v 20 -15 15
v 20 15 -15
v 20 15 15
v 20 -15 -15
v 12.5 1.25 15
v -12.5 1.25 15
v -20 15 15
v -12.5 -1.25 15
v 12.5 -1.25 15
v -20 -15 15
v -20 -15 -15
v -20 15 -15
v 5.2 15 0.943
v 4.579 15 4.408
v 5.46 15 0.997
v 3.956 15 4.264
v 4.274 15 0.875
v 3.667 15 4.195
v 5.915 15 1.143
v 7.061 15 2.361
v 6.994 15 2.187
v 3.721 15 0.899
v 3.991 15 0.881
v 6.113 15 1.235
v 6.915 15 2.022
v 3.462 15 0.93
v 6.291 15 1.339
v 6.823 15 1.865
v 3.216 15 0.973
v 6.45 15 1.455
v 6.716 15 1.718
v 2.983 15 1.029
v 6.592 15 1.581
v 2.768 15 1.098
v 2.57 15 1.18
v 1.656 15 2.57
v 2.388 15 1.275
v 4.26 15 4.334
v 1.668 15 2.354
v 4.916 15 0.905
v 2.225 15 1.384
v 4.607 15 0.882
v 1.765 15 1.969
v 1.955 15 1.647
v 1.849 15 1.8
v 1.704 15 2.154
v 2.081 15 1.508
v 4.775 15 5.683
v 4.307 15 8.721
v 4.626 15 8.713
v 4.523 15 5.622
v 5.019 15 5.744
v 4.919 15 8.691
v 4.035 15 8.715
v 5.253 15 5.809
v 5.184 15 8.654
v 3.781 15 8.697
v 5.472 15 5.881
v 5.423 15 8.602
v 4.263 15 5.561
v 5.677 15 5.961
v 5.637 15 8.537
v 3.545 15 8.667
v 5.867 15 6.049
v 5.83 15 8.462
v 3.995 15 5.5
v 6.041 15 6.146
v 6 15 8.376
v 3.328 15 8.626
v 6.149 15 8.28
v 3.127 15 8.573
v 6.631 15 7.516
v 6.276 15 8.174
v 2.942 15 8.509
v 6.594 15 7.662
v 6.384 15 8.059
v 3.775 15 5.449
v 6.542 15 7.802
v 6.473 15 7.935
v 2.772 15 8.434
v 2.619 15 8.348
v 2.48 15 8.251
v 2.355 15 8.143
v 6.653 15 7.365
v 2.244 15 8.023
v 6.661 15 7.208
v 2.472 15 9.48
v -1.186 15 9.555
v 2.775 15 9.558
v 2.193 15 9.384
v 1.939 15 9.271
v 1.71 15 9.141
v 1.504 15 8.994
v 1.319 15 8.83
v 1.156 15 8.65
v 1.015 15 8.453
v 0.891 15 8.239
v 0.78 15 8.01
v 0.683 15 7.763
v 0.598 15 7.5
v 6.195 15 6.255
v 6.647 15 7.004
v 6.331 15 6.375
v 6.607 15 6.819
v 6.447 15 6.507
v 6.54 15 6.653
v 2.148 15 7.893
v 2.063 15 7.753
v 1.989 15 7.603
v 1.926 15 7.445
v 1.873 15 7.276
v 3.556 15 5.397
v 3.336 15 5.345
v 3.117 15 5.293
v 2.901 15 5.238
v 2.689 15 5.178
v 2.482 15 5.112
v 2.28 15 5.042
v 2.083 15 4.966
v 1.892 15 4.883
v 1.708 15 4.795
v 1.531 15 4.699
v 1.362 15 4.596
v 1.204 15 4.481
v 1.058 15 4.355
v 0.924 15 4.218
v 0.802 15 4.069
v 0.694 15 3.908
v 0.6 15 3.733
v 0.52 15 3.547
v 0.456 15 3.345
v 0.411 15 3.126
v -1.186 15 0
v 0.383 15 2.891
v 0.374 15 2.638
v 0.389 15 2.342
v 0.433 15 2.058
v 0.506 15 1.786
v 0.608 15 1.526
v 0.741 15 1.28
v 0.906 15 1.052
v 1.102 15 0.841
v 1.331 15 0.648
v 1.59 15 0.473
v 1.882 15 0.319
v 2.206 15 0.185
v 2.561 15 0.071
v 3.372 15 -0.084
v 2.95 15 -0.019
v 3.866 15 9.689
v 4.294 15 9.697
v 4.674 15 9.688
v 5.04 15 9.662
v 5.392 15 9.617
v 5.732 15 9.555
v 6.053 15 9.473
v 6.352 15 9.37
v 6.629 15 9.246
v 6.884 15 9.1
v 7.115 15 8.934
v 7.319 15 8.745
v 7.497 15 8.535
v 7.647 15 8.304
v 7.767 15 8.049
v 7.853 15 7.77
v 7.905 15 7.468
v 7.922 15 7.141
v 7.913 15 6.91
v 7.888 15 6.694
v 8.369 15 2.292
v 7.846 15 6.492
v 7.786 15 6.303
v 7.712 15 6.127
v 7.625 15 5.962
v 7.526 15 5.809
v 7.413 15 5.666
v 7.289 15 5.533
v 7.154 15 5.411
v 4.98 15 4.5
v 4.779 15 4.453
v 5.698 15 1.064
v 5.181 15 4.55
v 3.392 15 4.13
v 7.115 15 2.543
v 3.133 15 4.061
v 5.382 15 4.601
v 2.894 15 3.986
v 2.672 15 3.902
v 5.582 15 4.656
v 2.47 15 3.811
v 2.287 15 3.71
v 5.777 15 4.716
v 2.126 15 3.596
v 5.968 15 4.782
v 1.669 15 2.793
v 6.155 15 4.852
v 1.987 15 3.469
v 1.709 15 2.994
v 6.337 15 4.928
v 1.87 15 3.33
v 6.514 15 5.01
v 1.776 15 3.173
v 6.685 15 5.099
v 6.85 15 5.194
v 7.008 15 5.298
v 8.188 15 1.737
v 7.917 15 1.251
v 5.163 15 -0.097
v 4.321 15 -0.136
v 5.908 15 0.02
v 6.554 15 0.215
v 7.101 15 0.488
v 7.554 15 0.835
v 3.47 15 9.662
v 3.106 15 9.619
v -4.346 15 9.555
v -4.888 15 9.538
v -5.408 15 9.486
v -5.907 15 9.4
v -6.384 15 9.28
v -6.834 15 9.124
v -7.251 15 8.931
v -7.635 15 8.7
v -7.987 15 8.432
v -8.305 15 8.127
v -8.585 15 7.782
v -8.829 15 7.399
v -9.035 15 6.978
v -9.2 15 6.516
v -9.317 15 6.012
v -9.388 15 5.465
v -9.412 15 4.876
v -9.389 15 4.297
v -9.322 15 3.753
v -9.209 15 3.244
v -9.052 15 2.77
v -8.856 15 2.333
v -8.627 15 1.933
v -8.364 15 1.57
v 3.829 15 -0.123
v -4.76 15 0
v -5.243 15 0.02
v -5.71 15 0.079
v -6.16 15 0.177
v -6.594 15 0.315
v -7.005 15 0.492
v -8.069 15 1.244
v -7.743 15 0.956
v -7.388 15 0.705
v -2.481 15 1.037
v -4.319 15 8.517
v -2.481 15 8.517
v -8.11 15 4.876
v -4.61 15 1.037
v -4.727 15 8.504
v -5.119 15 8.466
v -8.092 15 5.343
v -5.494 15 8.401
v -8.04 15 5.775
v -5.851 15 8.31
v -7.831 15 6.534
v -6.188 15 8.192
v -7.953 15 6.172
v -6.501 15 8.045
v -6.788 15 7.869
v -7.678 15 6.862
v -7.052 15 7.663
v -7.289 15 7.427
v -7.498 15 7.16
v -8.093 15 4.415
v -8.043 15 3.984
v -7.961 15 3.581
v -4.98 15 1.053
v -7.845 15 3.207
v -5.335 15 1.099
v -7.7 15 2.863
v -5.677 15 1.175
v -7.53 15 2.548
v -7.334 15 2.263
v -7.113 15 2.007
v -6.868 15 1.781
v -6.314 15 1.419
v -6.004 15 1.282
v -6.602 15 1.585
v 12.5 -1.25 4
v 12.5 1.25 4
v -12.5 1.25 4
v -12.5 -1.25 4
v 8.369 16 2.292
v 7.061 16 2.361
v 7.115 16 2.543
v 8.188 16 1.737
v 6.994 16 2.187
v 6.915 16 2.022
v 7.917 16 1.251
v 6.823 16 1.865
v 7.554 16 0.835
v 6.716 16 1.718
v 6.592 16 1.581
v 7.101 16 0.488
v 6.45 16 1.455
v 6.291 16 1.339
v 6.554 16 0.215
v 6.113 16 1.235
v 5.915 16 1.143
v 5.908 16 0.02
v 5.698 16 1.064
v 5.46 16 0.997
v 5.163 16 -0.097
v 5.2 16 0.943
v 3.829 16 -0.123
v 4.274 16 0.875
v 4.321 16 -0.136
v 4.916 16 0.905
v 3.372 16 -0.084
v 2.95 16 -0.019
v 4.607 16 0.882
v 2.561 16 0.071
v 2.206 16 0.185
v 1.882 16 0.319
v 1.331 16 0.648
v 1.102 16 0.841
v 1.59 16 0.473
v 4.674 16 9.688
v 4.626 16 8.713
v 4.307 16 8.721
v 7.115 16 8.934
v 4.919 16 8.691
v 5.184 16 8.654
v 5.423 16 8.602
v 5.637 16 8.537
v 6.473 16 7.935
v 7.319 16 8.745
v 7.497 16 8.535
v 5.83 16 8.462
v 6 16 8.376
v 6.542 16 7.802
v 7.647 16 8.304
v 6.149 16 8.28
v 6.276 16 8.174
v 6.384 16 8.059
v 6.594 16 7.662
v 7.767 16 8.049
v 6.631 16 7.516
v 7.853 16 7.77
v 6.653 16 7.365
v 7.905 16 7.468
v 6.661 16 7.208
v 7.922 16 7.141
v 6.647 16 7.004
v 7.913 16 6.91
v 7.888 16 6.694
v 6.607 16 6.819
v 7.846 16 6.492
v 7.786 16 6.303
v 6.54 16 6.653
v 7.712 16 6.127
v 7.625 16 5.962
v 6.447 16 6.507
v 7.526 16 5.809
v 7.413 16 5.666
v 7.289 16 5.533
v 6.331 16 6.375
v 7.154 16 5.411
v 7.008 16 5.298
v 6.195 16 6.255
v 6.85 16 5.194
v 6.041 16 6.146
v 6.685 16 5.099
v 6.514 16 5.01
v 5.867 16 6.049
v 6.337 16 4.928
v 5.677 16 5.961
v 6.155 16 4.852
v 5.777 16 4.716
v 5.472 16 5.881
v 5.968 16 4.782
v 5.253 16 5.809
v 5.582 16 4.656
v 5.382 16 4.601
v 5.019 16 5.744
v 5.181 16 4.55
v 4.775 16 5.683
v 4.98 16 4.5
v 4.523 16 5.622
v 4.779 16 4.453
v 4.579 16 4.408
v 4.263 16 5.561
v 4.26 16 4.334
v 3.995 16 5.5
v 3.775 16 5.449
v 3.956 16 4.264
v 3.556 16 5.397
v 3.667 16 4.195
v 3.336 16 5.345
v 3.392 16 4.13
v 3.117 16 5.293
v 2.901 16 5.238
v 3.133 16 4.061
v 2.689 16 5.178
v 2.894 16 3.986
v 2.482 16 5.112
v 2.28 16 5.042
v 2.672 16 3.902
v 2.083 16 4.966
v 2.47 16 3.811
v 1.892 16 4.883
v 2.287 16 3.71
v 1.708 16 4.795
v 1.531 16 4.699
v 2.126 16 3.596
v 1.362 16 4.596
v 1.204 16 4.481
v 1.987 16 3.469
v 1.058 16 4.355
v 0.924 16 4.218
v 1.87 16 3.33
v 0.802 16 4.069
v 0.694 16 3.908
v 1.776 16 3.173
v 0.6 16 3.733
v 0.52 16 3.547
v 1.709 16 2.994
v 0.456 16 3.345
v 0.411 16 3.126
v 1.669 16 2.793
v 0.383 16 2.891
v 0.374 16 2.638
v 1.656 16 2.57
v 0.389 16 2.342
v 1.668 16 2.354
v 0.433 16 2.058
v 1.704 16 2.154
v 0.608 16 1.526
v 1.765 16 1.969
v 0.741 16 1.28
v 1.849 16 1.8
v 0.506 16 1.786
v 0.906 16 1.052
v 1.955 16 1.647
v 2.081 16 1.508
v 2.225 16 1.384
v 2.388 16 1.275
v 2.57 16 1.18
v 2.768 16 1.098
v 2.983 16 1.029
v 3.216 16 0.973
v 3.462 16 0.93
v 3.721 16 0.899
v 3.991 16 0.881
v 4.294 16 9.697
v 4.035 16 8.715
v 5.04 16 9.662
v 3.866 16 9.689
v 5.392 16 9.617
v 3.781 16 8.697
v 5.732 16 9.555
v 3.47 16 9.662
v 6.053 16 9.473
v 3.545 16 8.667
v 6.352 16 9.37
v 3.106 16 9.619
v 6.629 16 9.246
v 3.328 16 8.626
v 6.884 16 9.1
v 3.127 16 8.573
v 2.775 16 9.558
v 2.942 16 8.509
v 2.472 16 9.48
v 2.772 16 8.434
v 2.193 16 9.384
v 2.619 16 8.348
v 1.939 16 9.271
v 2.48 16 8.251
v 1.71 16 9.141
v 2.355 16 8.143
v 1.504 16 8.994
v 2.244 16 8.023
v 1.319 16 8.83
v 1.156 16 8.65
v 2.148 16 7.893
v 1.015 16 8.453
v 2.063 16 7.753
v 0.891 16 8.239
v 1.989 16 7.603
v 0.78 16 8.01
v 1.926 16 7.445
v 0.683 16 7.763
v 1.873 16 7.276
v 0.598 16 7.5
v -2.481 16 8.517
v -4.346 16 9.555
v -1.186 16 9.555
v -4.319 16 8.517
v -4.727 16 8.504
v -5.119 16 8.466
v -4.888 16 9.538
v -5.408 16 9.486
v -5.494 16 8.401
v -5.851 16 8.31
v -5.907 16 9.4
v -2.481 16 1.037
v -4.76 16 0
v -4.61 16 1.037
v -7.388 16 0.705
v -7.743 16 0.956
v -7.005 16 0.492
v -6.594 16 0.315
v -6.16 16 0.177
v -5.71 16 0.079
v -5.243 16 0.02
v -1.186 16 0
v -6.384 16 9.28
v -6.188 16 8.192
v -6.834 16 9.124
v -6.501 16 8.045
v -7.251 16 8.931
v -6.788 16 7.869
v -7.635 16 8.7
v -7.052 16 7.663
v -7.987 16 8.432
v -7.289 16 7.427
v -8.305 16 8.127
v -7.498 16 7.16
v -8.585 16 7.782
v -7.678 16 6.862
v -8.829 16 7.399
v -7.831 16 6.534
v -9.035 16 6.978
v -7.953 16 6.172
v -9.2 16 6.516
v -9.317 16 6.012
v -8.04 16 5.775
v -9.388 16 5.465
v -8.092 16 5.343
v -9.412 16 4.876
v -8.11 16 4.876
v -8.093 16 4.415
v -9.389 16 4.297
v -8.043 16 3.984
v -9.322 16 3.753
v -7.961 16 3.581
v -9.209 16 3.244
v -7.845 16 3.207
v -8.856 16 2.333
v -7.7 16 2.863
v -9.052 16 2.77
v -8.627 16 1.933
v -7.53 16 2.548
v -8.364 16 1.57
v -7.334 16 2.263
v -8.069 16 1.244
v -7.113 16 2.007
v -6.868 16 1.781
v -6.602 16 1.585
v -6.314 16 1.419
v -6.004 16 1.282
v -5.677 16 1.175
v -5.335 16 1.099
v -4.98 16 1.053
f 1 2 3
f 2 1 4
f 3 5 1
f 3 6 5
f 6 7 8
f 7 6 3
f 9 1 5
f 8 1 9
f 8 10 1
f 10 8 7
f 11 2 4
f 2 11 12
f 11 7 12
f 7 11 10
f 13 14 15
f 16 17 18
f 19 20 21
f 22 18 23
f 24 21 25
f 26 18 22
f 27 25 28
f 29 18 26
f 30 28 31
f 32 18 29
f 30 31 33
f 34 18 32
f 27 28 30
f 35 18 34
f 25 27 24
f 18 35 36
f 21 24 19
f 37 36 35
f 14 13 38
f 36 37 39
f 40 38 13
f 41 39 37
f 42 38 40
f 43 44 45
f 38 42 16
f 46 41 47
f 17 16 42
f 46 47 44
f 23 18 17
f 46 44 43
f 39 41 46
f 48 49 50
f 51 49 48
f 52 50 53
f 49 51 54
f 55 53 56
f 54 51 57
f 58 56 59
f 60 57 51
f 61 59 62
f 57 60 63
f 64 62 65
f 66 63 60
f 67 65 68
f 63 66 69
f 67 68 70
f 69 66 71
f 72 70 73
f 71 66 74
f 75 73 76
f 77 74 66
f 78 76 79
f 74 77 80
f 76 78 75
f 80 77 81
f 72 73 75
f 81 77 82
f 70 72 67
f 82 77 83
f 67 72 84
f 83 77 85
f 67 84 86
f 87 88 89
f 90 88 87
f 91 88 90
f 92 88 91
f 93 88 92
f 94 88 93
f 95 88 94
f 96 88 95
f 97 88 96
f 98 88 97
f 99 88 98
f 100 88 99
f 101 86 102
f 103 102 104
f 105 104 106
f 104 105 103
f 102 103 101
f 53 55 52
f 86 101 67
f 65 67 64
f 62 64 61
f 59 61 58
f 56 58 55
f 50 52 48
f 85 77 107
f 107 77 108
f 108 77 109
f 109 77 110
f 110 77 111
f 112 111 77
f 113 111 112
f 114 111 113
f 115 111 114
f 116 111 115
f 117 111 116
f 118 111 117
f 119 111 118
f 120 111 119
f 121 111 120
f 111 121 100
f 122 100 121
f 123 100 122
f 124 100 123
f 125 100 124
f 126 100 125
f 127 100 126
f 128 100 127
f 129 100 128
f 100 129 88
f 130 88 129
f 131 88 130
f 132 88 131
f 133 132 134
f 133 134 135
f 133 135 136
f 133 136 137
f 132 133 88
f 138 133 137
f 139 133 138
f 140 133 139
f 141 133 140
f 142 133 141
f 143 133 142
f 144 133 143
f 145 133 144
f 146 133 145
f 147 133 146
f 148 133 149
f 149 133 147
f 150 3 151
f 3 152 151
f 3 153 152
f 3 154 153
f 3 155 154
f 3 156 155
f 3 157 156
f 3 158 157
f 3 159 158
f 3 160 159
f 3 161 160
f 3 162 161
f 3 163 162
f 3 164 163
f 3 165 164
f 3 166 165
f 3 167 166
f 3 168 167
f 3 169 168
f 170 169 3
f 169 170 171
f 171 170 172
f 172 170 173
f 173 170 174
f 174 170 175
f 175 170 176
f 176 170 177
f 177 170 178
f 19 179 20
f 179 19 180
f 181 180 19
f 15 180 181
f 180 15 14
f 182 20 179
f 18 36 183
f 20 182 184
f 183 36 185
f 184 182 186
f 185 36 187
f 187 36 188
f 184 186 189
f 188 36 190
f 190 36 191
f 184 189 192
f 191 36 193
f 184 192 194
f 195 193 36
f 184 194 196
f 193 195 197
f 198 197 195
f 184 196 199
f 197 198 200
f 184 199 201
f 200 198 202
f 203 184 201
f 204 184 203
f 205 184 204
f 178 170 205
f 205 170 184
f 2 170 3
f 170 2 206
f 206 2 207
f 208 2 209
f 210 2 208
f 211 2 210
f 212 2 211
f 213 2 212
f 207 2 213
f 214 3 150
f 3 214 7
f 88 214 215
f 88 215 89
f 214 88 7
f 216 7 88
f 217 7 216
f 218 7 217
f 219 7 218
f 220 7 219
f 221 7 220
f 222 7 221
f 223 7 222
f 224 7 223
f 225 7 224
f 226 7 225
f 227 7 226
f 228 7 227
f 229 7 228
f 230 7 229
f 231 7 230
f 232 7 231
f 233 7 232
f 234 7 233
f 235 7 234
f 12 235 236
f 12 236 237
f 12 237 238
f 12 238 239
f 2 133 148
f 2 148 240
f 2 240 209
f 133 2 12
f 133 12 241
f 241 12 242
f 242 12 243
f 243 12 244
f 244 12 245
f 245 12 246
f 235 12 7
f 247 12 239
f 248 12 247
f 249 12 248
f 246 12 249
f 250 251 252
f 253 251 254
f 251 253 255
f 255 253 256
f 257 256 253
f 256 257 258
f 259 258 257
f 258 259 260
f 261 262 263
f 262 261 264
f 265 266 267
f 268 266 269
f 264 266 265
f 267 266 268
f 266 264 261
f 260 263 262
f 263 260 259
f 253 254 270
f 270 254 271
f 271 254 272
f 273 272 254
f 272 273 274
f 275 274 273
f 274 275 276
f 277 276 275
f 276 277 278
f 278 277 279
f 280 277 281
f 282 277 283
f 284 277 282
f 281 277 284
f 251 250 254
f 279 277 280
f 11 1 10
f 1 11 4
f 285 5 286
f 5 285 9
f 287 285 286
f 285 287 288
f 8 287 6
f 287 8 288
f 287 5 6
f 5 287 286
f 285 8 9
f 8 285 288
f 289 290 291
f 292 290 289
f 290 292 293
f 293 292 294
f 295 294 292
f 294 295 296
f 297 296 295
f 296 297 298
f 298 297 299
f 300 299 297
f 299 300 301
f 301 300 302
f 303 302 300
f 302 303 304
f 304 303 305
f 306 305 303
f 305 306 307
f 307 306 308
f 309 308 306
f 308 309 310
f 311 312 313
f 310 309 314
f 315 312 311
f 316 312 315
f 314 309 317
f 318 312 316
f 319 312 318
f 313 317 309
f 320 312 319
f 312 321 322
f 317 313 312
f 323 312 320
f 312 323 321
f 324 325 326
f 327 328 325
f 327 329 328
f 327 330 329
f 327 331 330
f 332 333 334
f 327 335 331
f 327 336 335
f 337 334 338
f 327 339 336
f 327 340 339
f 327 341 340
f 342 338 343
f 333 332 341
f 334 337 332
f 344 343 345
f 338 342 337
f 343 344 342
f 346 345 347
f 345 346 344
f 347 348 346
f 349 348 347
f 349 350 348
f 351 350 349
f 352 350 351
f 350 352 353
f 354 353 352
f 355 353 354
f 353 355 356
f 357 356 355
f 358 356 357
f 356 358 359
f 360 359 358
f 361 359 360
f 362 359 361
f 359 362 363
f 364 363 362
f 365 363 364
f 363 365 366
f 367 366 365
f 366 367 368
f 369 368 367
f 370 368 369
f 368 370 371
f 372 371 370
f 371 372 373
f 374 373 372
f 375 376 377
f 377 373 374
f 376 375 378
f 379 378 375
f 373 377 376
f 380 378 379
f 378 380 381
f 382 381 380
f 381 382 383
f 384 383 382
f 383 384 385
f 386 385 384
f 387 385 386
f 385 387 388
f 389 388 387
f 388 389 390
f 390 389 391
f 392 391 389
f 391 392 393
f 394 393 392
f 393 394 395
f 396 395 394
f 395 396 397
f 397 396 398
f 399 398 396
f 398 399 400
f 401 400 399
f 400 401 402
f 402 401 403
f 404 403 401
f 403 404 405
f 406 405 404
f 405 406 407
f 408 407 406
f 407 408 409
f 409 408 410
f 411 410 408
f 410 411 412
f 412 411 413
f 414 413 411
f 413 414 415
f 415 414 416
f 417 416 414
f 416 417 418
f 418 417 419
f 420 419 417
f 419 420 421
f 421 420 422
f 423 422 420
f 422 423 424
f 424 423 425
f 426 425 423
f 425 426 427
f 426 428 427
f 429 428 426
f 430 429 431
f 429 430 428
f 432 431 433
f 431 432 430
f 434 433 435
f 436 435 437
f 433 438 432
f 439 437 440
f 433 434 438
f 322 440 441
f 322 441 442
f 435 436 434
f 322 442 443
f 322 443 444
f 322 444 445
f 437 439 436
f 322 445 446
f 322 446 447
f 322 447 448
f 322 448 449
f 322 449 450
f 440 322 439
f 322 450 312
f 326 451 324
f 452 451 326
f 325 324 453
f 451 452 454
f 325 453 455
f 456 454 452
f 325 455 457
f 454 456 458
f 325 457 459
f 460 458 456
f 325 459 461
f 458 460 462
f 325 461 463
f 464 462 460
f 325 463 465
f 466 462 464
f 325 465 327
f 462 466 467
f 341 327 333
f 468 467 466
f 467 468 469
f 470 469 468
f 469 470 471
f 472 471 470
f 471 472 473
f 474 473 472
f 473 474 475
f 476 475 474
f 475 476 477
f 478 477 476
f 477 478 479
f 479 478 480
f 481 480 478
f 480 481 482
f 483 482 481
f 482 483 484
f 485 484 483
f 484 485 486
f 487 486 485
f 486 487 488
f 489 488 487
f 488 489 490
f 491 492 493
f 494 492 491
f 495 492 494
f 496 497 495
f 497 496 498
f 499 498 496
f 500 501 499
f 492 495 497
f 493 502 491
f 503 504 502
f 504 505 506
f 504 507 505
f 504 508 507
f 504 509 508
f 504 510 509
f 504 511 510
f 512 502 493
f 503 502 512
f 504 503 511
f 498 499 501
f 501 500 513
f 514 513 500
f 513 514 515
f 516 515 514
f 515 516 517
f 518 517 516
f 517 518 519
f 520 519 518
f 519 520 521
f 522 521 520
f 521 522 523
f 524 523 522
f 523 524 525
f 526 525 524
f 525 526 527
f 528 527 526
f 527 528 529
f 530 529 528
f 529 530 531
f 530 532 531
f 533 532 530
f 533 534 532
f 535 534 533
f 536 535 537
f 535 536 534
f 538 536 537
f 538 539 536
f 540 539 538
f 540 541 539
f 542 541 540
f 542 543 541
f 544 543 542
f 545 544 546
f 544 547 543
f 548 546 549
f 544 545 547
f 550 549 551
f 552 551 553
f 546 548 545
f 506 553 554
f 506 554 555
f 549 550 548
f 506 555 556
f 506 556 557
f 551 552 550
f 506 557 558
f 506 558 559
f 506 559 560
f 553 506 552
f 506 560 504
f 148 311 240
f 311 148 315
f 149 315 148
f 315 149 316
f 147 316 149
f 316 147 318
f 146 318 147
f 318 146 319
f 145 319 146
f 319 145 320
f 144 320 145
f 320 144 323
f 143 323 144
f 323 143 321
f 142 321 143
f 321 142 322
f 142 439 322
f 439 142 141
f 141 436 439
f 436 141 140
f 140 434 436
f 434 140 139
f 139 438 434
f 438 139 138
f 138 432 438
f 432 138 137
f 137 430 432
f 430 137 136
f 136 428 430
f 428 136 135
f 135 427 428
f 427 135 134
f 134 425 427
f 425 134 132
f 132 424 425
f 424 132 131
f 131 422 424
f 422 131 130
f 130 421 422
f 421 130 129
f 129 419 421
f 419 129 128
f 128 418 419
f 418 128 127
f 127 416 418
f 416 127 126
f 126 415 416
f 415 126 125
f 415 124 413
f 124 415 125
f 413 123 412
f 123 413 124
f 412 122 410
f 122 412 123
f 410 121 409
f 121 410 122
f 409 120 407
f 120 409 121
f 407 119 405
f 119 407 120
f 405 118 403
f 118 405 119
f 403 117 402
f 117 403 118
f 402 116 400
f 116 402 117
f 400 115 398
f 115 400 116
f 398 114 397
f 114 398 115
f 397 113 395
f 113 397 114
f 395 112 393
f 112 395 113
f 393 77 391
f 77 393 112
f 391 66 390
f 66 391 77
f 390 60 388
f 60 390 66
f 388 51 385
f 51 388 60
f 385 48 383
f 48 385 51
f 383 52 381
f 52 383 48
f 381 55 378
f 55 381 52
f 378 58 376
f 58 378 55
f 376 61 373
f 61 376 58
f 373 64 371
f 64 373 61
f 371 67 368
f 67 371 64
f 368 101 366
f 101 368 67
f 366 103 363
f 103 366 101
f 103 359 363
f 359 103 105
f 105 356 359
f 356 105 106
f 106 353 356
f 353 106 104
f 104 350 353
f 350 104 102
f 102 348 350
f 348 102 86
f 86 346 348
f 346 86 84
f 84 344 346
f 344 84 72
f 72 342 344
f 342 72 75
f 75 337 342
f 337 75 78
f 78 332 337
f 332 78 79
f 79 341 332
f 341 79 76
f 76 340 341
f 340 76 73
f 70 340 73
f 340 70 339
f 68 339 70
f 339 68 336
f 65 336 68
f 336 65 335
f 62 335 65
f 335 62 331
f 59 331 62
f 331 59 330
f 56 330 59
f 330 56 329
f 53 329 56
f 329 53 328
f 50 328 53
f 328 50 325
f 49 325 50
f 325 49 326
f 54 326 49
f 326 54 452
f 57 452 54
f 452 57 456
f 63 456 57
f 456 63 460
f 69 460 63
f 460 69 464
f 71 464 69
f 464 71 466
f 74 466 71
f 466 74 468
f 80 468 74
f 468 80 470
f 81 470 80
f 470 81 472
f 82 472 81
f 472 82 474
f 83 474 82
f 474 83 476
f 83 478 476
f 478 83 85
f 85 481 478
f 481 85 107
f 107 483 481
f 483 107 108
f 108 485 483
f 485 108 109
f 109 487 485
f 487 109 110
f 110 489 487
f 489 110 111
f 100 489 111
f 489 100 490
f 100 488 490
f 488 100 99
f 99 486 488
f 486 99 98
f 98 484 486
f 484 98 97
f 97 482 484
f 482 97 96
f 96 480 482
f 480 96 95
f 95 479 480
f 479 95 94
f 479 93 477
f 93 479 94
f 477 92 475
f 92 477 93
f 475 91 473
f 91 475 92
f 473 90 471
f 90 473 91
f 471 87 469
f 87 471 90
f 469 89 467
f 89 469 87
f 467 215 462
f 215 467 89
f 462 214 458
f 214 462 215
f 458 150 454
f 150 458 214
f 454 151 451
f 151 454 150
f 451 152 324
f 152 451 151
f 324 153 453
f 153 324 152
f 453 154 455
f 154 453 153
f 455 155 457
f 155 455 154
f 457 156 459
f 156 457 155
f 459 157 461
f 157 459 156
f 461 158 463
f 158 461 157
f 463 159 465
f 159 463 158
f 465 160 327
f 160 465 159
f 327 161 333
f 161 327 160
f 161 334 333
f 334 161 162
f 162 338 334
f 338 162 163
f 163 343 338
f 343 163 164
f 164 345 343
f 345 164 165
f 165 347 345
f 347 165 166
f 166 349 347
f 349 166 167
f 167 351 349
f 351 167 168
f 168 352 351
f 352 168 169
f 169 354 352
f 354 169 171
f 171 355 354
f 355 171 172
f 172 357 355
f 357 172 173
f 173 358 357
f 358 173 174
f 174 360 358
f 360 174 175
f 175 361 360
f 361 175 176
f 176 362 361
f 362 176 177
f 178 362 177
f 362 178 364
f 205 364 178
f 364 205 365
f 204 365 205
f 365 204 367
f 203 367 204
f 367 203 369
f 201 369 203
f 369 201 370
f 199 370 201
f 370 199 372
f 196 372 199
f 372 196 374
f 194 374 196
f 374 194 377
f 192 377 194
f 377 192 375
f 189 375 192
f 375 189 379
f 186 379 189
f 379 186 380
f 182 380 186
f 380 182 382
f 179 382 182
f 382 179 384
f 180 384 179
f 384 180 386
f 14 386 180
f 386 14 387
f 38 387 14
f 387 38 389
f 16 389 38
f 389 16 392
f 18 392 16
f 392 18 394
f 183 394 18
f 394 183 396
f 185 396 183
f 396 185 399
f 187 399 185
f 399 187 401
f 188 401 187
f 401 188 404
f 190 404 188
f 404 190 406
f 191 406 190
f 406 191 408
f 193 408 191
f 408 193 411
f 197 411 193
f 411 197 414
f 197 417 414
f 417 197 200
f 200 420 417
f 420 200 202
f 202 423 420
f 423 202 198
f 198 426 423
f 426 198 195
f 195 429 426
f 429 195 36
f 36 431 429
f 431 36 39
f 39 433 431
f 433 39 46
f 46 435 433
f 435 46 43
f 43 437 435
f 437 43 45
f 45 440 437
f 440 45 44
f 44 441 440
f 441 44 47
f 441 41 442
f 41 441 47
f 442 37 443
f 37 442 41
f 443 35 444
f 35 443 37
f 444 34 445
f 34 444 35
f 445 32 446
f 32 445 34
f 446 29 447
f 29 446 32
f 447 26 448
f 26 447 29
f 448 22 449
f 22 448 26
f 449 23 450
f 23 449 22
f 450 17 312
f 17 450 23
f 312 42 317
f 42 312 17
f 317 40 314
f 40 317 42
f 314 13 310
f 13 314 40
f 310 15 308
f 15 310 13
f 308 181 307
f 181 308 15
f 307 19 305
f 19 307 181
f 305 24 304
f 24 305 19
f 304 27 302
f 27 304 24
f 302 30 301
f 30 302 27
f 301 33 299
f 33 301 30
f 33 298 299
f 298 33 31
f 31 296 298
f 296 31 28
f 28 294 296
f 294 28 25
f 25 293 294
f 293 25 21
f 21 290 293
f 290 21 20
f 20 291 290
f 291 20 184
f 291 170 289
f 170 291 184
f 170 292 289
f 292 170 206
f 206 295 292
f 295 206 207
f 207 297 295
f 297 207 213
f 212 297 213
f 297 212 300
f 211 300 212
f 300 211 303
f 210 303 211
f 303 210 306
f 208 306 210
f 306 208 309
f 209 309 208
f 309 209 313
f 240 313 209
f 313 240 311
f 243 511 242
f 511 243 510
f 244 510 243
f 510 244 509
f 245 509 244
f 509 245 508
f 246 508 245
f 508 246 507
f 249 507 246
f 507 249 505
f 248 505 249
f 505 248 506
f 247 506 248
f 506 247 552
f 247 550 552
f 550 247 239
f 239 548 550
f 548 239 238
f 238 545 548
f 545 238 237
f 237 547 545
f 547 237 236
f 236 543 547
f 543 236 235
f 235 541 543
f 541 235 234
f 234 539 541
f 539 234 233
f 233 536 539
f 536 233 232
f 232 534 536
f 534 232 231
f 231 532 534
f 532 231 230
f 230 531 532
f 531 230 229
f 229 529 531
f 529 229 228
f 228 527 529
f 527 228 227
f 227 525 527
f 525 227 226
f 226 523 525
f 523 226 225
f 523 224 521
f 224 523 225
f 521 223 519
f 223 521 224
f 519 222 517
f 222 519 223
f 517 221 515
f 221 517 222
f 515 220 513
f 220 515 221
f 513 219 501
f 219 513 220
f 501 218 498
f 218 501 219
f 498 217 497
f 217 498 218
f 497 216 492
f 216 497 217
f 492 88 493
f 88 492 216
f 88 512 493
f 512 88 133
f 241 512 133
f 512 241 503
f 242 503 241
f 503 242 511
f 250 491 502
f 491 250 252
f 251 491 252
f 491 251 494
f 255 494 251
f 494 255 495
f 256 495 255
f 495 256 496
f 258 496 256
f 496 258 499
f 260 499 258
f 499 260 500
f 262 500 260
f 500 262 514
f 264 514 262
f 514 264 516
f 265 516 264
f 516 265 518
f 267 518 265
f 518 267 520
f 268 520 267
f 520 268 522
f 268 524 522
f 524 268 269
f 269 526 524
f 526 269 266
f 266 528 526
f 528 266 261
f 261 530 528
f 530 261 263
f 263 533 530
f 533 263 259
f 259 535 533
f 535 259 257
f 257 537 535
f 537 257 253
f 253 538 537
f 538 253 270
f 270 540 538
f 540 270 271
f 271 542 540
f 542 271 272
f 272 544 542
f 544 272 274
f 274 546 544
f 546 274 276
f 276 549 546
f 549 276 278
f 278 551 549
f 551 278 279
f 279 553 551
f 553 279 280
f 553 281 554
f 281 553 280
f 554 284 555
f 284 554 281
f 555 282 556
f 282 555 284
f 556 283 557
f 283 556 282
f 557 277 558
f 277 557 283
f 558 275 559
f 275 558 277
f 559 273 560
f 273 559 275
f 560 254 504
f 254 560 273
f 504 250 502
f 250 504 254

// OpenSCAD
//SD card holder
difference() {
    cube([40,30,30], center=true);
    translate([0,0,10]) cube([25,2.5,12],center=true);
}
translate([9,14,0]) rotate([-90,180,0]) linear_extrude(2) text("SD",10);
